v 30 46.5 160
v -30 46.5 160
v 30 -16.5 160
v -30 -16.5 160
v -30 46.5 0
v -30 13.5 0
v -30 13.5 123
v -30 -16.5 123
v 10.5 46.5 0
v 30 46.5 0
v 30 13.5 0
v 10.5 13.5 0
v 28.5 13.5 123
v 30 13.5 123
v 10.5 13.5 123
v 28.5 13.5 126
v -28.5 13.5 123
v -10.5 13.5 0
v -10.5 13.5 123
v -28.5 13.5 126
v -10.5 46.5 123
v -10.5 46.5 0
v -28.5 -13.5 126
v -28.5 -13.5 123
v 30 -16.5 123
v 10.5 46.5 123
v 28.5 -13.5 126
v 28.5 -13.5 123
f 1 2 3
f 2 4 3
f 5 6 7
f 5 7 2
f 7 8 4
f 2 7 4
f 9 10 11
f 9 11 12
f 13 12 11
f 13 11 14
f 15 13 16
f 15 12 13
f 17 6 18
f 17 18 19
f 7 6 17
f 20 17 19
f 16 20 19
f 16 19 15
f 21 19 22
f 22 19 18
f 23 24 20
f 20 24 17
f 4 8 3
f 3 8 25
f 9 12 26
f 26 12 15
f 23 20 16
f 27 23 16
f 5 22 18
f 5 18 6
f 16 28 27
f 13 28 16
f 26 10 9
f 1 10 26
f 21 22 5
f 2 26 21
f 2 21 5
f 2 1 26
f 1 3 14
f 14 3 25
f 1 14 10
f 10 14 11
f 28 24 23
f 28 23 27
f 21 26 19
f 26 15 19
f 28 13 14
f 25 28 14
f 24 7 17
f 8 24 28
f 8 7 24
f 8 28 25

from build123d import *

# Parameters (mm, degrees)
F0_W      = 60
F0_H      = 33
F1_DEPTH  = 160
F2_W      = 30
F2_H      = 123
F3_DEPTH  = 60.001
F4_W      = 21
F4_H      = 123
F5_DEPTH  = 33.001
F7_W      = 57
F7_H      = 27
F8_DEPTH  = 3
F9_W      = 21
F9_H      = 37
F10_DEPTH = 30


with BuildPart() as f1:
    # F0 (on Top) → F1 (new body)
    with BuildSketch(Plane.XY):
        Rectangle(F0_W, F0_H)
    extrude(amount=F1_DEPTH)

    # F2 (on face) → F3 (cut, through all)
    with BuildSketch(Plane(origin=(-30, 0, 0), x_dir=(0, -1, 0), z_dir=(-1, 0, 0))):
        with Locations((1.5, 61.5)):
            Rectangle(F2_W, F2_H)
    extrude(amount=-F3_DEPTH, mode=Mode.SUBTRACT)

    # F4 (on face) → F5 (cut, through all)
    with BuildSketch(Plane(origin=(0, 16.5, 0), x_dir=(-1, 0, 0), z_dir=(0, 1, 0))):
        with Locations((0, -61.5)):
            Rectangle(F4_W, F4_H)
        with Locations((0, 61.5)):
            Rectangle(F4_W, F4_H)
    extrude(amount=-F5_DEPTH, mode=Mode.SUBTRACT)

    # F7 (on offset) → F8 (cut)
    with BuildSketch(Plane.XY.offset(123)):
        Rectangle(F7_W, F7_H)
    extrude(amount=F8_DEPTH, mode=Mode.SUBTRACT)

    # F9 (on face) → F10 (join)
    with BuildSketch(Plane(origin=(0, 16.5, 0), x_dir=(-1, 0, 0), z_dir=(0, 1, 0))):
        Polygon((30, 0), (30, 160), (10.5, 160), (10.5, 123), (10.5, 0), align=None)
        with Locations((0, 141.5)):
            Rectangle(F9_W, F9_H)
        Polygon((-10.5, 123), (-10.5, 160), (-30, 160), (-30, 0), (-10.5, 0), align=None)
    extrude(amount=F10_DEPTH)


solid = f1.part
